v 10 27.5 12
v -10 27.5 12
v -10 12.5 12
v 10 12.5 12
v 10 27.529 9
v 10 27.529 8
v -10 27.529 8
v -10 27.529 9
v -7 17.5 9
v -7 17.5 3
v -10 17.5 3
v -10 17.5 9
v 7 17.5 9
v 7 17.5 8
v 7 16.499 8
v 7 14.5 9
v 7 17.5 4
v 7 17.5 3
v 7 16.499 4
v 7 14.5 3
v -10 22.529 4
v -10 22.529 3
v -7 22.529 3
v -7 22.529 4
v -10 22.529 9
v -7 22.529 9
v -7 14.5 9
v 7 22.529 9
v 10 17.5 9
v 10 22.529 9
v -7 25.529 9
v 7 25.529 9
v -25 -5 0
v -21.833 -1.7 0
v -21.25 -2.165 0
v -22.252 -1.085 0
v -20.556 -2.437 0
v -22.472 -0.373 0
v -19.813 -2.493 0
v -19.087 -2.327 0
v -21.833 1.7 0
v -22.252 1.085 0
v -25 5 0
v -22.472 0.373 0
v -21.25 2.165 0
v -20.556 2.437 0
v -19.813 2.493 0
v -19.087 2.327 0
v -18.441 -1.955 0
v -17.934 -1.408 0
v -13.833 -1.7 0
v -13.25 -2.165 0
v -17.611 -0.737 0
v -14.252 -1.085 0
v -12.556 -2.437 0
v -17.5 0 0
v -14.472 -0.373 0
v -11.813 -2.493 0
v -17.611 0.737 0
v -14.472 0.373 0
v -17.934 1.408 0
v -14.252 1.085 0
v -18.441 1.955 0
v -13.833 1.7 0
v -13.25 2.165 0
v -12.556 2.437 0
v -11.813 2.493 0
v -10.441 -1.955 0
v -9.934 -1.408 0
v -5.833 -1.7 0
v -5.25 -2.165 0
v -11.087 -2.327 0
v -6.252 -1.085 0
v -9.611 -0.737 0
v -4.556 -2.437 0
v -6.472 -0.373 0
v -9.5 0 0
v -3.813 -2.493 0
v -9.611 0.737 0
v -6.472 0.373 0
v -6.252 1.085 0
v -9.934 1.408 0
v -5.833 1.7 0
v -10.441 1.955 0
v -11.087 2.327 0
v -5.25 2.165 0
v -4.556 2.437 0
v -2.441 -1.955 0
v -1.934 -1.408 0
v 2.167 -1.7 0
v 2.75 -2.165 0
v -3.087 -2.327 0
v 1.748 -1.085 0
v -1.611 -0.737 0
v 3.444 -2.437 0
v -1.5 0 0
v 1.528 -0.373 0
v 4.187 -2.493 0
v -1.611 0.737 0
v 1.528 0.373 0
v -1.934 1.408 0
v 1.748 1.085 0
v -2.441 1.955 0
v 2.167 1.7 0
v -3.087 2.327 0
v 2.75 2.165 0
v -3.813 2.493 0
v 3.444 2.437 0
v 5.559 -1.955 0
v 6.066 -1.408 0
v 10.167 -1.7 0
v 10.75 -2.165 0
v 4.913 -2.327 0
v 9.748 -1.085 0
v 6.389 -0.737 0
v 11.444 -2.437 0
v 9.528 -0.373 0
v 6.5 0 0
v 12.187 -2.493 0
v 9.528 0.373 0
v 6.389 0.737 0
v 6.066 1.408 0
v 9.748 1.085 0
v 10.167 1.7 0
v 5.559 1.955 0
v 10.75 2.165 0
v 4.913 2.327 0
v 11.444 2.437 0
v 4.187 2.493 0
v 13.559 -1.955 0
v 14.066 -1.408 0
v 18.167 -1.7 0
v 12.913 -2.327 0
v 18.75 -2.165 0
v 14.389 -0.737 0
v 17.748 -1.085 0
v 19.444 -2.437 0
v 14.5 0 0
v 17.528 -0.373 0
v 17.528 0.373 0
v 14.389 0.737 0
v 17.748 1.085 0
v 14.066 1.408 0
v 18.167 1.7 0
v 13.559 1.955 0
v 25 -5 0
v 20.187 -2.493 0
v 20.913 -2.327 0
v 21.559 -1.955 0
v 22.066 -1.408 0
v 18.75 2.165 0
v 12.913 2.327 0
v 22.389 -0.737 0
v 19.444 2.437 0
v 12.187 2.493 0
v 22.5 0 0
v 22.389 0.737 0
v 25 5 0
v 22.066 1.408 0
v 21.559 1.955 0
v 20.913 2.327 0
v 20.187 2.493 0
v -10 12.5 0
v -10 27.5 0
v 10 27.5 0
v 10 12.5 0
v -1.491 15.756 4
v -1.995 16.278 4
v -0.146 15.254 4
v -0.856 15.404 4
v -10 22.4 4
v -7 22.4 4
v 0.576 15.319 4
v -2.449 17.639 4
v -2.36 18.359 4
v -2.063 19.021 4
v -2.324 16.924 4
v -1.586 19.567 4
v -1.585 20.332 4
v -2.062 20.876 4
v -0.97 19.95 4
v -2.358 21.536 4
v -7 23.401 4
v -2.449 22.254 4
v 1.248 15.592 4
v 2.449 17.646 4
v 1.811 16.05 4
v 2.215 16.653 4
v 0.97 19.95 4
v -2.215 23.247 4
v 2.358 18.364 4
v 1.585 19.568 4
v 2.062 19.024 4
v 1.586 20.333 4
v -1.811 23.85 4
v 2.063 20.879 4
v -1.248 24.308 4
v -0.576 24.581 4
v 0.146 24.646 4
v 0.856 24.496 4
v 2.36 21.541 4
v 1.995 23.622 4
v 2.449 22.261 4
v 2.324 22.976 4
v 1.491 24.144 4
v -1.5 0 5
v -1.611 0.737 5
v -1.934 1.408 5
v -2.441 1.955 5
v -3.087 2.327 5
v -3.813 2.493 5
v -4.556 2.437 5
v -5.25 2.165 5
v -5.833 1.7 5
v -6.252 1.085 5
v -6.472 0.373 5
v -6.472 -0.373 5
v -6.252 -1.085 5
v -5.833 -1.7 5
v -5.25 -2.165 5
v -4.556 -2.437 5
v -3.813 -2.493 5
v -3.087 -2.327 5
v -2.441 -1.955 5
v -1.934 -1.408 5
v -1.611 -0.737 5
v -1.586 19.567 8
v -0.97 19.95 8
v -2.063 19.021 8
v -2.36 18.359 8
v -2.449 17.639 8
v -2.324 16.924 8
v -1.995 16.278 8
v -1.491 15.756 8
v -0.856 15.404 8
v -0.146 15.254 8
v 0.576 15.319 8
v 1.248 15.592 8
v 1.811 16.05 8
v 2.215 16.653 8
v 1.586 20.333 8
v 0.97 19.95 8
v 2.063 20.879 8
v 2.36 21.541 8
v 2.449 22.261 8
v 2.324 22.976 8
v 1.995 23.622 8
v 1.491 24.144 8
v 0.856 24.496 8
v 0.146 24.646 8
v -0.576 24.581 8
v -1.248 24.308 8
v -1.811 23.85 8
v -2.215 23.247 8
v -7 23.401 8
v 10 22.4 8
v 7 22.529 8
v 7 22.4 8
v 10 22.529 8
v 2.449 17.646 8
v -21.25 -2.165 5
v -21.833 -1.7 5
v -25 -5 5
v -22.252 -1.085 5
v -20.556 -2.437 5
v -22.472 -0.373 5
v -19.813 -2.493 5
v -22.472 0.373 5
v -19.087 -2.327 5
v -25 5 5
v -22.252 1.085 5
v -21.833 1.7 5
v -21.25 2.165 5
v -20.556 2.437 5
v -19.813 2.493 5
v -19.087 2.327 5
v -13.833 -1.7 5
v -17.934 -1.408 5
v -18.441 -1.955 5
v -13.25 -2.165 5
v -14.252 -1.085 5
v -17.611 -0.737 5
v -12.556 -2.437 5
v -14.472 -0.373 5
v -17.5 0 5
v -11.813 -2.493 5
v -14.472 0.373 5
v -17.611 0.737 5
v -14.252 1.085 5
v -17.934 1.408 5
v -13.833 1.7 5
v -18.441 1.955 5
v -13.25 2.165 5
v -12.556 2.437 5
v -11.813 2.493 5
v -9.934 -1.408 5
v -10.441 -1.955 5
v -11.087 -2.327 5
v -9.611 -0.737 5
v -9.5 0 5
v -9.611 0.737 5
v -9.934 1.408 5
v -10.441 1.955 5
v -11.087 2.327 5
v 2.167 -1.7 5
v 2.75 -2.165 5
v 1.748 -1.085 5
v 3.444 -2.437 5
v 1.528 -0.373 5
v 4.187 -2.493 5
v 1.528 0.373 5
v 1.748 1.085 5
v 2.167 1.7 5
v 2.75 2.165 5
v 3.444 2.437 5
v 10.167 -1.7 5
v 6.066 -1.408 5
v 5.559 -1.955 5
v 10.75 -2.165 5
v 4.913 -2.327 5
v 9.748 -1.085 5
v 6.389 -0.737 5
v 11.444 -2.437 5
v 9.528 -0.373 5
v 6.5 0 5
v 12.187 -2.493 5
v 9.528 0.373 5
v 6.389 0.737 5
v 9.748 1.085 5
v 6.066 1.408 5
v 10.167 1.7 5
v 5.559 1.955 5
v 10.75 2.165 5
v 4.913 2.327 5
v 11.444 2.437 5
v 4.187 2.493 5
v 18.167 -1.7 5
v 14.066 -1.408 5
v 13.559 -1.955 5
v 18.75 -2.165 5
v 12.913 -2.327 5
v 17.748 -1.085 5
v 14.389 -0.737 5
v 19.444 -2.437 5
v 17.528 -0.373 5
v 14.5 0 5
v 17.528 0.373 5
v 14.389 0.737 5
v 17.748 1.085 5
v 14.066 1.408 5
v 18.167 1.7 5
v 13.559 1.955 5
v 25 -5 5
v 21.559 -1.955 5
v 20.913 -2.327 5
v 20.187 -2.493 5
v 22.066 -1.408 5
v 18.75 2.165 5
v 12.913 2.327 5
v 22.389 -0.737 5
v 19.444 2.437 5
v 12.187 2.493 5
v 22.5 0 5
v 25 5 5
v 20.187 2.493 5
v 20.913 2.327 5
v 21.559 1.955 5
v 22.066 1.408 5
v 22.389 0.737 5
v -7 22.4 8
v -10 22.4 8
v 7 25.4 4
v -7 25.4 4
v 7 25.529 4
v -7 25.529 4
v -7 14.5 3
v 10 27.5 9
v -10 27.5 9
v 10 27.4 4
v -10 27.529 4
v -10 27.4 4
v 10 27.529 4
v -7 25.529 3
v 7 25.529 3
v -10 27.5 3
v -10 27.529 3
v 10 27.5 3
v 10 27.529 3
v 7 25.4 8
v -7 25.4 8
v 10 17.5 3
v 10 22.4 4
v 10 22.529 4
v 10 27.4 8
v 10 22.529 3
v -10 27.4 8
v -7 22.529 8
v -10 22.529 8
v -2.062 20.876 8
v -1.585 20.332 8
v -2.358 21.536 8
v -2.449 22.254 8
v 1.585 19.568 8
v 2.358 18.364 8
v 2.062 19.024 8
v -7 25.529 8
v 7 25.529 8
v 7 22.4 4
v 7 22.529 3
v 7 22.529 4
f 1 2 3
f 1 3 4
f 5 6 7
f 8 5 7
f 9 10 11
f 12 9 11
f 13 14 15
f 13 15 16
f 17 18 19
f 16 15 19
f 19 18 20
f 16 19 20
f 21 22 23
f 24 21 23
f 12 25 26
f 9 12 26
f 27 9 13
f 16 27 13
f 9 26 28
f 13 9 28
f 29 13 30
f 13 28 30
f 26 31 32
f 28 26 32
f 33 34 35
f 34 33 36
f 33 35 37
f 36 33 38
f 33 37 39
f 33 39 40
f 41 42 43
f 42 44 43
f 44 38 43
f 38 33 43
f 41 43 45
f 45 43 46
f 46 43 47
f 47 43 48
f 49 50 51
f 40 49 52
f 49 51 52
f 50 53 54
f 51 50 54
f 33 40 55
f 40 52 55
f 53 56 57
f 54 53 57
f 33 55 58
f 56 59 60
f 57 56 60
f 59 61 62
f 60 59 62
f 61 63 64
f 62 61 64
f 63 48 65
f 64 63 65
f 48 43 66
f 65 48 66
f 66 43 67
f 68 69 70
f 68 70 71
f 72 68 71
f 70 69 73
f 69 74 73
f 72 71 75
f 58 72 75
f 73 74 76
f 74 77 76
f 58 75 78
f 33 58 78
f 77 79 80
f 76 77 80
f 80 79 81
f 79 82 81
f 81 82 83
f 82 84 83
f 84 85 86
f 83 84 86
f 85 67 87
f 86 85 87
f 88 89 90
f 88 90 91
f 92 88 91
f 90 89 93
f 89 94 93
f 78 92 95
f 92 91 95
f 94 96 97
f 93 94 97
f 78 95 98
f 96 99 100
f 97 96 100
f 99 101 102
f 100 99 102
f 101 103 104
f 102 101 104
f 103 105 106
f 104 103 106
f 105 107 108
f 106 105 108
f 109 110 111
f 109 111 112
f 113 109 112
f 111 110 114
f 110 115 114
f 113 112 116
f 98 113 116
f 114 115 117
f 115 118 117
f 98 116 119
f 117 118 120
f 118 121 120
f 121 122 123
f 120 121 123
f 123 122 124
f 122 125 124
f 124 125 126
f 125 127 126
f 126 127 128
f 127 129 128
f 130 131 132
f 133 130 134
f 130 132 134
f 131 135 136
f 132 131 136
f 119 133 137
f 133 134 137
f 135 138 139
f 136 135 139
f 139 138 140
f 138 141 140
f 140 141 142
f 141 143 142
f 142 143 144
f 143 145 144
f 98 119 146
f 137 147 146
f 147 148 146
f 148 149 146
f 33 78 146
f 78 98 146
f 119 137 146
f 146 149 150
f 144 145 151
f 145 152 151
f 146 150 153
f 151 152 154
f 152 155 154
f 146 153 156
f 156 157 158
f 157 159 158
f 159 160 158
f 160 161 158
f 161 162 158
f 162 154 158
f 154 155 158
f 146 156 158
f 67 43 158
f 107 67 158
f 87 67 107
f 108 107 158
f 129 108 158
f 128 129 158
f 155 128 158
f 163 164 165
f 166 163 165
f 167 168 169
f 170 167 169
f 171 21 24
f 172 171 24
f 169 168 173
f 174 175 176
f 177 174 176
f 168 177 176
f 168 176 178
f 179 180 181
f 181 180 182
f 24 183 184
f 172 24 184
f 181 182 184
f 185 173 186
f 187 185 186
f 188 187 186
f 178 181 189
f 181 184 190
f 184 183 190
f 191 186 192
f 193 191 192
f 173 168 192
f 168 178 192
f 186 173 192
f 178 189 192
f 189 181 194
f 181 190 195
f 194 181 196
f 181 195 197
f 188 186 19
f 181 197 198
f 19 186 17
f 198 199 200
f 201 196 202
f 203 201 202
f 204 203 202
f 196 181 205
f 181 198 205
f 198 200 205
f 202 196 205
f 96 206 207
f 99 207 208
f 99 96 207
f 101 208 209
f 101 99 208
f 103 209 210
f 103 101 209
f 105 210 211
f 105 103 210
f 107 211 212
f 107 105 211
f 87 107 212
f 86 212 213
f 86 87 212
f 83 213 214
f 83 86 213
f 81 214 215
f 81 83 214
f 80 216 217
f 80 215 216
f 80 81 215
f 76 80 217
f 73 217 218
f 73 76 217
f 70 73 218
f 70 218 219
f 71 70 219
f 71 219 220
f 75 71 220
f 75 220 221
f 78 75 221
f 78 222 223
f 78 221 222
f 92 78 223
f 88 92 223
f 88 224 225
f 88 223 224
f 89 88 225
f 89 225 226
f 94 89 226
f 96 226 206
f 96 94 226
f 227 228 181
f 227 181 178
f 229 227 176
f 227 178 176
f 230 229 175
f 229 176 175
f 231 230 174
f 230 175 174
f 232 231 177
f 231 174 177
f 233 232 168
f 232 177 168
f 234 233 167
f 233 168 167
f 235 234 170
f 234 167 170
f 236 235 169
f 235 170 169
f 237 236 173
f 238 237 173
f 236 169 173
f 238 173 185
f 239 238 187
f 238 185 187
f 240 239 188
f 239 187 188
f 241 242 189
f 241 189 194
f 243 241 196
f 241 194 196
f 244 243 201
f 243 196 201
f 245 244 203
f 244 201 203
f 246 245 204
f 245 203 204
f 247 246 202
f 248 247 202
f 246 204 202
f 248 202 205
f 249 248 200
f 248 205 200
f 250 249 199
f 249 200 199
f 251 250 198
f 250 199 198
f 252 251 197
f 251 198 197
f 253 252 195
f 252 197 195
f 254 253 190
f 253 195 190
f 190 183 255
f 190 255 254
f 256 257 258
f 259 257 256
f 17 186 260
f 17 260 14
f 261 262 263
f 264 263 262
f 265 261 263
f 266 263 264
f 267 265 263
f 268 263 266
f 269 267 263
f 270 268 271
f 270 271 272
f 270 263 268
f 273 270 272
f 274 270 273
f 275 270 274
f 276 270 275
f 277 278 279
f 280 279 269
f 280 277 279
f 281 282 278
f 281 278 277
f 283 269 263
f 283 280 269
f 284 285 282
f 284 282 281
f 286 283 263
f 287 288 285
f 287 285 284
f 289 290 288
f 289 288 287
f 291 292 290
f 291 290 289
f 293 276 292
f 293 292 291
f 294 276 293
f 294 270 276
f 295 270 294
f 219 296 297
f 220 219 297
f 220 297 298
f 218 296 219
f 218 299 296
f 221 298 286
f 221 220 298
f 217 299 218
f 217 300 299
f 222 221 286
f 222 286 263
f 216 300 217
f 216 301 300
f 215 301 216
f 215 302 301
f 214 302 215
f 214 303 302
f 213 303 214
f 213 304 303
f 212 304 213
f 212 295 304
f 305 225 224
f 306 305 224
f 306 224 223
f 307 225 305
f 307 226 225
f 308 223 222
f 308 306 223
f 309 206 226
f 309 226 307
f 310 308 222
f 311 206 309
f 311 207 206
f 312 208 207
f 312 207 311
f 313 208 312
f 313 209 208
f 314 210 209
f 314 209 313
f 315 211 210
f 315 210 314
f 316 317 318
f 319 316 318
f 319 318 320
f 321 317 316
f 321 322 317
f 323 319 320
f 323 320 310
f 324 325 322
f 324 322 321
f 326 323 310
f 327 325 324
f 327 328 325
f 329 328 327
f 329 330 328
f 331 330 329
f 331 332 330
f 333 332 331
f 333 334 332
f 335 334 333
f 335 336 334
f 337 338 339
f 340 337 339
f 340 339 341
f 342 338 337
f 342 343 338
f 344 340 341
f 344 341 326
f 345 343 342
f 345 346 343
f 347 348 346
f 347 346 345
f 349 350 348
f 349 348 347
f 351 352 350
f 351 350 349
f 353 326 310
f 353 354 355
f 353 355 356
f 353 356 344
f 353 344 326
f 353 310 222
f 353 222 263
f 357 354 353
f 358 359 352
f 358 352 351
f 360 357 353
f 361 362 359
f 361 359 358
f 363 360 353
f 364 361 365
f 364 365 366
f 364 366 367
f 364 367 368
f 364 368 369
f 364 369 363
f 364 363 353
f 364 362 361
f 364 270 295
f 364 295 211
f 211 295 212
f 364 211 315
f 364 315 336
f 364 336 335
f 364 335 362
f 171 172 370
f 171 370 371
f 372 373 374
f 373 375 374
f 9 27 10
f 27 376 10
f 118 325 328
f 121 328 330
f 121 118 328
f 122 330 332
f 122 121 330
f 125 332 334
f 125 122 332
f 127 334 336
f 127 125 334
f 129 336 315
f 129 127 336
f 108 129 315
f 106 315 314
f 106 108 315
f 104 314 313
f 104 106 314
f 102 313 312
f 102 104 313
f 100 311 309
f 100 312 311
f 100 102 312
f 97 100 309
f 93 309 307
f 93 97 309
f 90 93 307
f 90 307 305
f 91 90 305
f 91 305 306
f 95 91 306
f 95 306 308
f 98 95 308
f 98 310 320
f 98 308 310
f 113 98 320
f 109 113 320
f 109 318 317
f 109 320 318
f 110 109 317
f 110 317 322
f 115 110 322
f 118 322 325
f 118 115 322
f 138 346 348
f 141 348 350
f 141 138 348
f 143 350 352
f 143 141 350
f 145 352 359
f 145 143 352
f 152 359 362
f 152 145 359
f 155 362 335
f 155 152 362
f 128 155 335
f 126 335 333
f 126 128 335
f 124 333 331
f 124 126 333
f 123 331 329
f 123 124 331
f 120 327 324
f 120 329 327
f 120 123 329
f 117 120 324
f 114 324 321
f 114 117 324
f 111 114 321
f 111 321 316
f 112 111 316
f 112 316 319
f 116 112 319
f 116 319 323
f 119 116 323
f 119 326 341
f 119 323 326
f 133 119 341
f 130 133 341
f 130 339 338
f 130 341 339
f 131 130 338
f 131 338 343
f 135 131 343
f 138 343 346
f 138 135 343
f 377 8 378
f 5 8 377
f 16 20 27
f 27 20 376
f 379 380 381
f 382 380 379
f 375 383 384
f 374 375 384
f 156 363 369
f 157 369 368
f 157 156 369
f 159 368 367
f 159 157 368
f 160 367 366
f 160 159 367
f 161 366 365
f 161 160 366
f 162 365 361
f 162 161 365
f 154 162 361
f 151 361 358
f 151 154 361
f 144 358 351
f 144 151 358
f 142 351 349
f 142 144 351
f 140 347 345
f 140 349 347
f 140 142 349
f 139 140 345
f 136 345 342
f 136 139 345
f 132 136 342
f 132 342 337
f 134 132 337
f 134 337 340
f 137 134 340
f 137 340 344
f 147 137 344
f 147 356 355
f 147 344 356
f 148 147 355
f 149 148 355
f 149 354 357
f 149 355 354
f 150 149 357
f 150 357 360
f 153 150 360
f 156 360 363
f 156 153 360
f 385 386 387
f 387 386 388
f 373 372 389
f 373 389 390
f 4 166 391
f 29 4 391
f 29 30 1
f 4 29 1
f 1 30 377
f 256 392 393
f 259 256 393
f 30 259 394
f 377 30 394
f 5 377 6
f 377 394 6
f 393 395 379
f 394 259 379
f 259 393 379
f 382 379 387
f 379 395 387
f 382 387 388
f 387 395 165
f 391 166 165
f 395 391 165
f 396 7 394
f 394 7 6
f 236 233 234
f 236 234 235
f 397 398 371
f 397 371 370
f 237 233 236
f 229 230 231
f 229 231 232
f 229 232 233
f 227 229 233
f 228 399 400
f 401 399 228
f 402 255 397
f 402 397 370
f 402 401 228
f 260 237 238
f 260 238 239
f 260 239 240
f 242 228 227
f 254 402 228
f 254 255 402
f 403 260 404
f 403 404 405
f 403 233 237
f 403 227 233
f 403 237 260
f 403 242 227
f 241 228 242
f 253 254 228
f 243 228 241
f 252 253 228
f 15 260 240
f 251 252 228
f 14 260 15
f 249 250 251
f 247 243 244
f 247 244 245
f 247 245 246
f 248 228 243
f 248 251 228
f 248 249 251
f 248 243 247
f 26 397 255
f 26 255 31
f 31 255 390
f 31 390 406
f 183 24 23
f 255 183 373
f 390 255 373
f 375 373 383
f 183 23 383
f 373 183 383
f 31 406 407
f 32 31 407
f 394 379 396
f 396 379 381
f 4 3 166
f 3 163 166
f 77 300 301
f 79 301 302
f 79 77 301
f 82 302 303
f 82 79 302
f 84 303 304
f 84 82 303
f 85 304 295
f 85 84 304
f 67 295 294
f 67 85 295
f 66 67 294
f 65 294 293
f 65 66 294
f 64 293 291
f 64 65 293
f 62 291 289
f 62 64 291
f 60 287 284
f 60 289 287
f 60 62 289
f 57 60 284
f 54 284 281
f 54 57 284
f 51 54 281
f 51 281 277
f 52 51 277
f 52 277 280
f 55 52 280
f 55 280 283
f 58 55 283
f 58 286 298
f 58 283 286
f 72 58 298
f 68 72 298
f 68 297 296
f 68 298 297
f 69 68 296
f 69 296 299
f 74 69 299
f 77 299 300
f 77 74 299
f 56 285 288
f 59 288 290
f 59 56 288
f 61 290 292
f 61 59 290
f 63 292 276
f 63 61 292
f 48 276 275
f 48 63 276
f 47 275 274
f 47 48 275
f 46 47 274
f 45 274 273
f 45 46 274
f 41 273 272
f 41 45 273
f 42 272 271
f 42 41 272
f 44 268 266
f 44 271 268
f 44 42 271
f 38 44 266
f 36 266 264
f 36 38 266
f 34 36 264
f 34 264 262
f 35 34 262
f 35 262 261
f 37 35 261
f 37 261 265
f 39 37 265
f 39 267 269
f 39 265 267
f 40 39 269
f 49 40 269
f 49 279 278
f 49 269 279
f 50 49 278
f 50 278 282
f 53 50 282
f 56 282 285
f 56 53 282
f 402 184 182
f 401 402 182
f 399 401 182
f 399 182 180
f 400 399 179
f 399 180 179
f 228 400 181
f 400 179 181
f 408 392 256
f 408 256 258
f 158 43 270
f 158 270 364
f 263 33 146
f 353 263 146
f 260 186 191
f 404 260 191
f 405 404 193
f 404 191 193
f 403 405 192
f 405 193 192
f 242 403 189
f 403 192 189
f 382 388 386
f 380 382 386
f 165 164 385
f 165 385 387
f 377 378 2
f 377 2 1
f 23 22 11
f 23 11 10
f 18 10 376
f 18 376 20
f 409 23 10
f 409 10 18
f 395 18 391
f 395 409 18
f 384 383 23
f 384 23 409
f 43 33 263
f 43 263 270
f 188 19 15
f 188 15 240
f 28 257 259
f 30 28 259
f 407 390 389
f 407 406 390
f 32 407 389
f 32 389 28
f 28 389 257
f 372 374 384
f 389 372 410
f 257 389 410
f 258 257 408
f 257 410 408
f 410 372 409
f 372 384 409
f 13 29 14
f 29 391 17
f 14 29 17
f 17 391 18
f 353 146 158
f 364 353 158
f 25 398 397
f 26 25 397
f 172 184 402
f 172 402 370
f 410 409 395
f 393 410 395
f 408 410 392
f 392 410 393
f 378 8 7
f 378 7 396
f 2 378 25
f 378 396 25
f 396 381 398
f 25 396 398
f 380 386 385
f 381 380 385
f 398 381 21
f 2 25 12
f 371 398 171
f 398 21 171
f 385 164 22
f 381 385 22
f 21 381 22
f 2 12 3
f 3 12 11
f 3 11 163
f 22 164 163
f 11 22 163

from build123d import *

# Parameters (mm, degrees)
SKETCH_W            = 50
SKETCH_H            = 10
PAD_DEPTH           = 5
SKETCH001_R         = 2.5
POCKET_DEPTH        = 5.001
LINEARPATTERN_COUNT = 6
LINEARPATTERN_PITCH = 8
SKETCH002_W         = 20
SKETCH002_H         = 15
PAD001_DEPTH        = 3
PAD002_DEPTH        = 1
PAD003_DEPTH        = 4
PAD004_DEPTH        = 1
SKETCH007_W         = 20
SKETCH007_H         = 15
PAD005_DEPTH        = 3
PAD006_DEPTH        = 1
PAD007_DEPTH        = 4
PAD008_DEPTH        = 1


with BuildPart() as body:
    # Sketch → Pad (new body)
    with BuildSketch(Plane.XY):
        Rectangle(SKETCH_W, SKETCH_H)
    extrude(amount=PAD_DEPTH)

    # Sketch001 → Pocket (cut, through all)
    with BuildSketch(Plane.XY):
        with Locations((-20, 0)):
            Circle(SKETCH001_R)
    pocket = extrude(amount=POCKET_DEPTH, mode=Mode.SUBTRACT)

    # LinearPattern: Pocket ×6
    with Locations(*[(i * LINEARPATTERN_PITCH, 0, 0) for i in range(1, LINEARPATTERN_COUNT)]):
        add(pocket, mode=Mode.SUBTRACT)


with BuildPart() as body001:
    # Sketch002 → Pad001 (new body)
    with BuildSketch(Plane.XY):
        with Locations((0, 20)):
            Rectangle(SKETCH002_W, SKETCH002_H)
    extrude(amount=PAD001_DEPTH)

    # Sketch003 (on DatumPlane) → Pad002 (join)
    with BuildSketch(Plane.XY.offset(3)):
        Polygon((-10, 12.5), (10, 12.5), (10, 17.5), (7, 17.5), (7, 14.5), (-7, 14.5), (-7, 17.5), (-10, 17.5), align=None)
    extrude(amount=PAD002_DEPTH)

    # Sketch005 (on DatumPlane) → Pad003 (join)
    with BuildSketch(Plane.XY.offset(4)):
        with BuildLine():
            Line((-10, 12.5), (10, 12.5))
            Line((10, 12.5), (10, 17.5))
            Line((7, 17.5), (10, 17.5))
            Line((2.449396, 17.645579), (7, 17.5))
            ThreePointArc((2.449396, 17.645579), (-2.384371, 18.263272), (2.214812, 16.652572))
            Line((7, 16.499488), (2.214812, 16.652572))
            Line((7, 16.499488), (7, 14.5))
            Line((-7, 14.5), (7, 14.5))
            Line((-7, 17.5), (-7, 14.5))
            Line((-10, 17.5), (-7, 17.5))
            Line((-10, 17.5), (-10, 12.5))
        make_face()
    extrude(amount=PAD003_DEPTH)

    # Sketch006 (on DatumPlane) → Pad004 (join)
    with BuildSketch(Plane.XY.offset(8)):
        Polygon((-10, 12.5), (10, 12.5), (10, 17.5), (7, 17.5), (7, 14.5), (-7, 14.5), (-7, 17.5), (-10, 17.5), align=None)
    extrude(amount=PAD004_DEPTH)

    # Sketch007 (on DatumPlane) → Pad005 (join)
    with BuildSketch(Plane.XY.offset(9)):
        with Locations((0, 20)):
            Rectangle(SKETCH007_W, SKETCH007_H)
    extrude(amount=PAD005_DEPTH)

    # Sketch008 (on DatumPlane) → Pad006 (join)
    with BuildSketch(Plane.XY.offset(3)):
        Polygon((10, 27.529465), (-10, 27.529465), (-10, 22.529465), (-7, 22.529465), (-7, 25.529465), (7, 25.529465), (7, 22.529465), (10, 22.529465), align=None)
    extrude(amount=PAD006_DEPTH)

    # Sketch009 (on DatumPlane) → Pad007 (join)
    with BuildSketch(Plane.XY.offset(4)):
        with BuildLine():
            Line((10, 27.4), (-10, 27.4))
            Line((-10, 27.4), (-10, 22.4))
            Line((-7, 22.4), (-10, 22.4))
            Line((-2.449395, 22.254421), (-7, 22.4))
            ThreePointArc((-2.449395, 22.254421), (2.384372, 21.636728), (-2.214812, 23.247428))
            Line((-7, 23.400512), (-2.214812, 23.247428))
            Line((-7, 23.400512), (-7, 25.4))
            Line((7, 25.4), (-7, 25.4))
            Line((7, 22.4), (7, 25.4))
            Line((10, 22.4), (7, 22.4))
            Line((10, 22.4), (10, 27.4))
        make_face()
    extrude(amount=PAD007_DEPTH)

    # Sketch010 (on DatumPlane) → Pad008 (join)
    with BuildSketch(Plane.XY.offset(8)):
        Polygon((10, 27.529465), (-10, 27.529465), (-10, 22.529465), (-7, 22.529465), (-7, 25.529465), (7, 25.529465), (7, 22.529465), (10, 22.529465), align=None)
    extrude(amount=PAD008_DEPTH)


solid = Compound([body.part, body001.part])
